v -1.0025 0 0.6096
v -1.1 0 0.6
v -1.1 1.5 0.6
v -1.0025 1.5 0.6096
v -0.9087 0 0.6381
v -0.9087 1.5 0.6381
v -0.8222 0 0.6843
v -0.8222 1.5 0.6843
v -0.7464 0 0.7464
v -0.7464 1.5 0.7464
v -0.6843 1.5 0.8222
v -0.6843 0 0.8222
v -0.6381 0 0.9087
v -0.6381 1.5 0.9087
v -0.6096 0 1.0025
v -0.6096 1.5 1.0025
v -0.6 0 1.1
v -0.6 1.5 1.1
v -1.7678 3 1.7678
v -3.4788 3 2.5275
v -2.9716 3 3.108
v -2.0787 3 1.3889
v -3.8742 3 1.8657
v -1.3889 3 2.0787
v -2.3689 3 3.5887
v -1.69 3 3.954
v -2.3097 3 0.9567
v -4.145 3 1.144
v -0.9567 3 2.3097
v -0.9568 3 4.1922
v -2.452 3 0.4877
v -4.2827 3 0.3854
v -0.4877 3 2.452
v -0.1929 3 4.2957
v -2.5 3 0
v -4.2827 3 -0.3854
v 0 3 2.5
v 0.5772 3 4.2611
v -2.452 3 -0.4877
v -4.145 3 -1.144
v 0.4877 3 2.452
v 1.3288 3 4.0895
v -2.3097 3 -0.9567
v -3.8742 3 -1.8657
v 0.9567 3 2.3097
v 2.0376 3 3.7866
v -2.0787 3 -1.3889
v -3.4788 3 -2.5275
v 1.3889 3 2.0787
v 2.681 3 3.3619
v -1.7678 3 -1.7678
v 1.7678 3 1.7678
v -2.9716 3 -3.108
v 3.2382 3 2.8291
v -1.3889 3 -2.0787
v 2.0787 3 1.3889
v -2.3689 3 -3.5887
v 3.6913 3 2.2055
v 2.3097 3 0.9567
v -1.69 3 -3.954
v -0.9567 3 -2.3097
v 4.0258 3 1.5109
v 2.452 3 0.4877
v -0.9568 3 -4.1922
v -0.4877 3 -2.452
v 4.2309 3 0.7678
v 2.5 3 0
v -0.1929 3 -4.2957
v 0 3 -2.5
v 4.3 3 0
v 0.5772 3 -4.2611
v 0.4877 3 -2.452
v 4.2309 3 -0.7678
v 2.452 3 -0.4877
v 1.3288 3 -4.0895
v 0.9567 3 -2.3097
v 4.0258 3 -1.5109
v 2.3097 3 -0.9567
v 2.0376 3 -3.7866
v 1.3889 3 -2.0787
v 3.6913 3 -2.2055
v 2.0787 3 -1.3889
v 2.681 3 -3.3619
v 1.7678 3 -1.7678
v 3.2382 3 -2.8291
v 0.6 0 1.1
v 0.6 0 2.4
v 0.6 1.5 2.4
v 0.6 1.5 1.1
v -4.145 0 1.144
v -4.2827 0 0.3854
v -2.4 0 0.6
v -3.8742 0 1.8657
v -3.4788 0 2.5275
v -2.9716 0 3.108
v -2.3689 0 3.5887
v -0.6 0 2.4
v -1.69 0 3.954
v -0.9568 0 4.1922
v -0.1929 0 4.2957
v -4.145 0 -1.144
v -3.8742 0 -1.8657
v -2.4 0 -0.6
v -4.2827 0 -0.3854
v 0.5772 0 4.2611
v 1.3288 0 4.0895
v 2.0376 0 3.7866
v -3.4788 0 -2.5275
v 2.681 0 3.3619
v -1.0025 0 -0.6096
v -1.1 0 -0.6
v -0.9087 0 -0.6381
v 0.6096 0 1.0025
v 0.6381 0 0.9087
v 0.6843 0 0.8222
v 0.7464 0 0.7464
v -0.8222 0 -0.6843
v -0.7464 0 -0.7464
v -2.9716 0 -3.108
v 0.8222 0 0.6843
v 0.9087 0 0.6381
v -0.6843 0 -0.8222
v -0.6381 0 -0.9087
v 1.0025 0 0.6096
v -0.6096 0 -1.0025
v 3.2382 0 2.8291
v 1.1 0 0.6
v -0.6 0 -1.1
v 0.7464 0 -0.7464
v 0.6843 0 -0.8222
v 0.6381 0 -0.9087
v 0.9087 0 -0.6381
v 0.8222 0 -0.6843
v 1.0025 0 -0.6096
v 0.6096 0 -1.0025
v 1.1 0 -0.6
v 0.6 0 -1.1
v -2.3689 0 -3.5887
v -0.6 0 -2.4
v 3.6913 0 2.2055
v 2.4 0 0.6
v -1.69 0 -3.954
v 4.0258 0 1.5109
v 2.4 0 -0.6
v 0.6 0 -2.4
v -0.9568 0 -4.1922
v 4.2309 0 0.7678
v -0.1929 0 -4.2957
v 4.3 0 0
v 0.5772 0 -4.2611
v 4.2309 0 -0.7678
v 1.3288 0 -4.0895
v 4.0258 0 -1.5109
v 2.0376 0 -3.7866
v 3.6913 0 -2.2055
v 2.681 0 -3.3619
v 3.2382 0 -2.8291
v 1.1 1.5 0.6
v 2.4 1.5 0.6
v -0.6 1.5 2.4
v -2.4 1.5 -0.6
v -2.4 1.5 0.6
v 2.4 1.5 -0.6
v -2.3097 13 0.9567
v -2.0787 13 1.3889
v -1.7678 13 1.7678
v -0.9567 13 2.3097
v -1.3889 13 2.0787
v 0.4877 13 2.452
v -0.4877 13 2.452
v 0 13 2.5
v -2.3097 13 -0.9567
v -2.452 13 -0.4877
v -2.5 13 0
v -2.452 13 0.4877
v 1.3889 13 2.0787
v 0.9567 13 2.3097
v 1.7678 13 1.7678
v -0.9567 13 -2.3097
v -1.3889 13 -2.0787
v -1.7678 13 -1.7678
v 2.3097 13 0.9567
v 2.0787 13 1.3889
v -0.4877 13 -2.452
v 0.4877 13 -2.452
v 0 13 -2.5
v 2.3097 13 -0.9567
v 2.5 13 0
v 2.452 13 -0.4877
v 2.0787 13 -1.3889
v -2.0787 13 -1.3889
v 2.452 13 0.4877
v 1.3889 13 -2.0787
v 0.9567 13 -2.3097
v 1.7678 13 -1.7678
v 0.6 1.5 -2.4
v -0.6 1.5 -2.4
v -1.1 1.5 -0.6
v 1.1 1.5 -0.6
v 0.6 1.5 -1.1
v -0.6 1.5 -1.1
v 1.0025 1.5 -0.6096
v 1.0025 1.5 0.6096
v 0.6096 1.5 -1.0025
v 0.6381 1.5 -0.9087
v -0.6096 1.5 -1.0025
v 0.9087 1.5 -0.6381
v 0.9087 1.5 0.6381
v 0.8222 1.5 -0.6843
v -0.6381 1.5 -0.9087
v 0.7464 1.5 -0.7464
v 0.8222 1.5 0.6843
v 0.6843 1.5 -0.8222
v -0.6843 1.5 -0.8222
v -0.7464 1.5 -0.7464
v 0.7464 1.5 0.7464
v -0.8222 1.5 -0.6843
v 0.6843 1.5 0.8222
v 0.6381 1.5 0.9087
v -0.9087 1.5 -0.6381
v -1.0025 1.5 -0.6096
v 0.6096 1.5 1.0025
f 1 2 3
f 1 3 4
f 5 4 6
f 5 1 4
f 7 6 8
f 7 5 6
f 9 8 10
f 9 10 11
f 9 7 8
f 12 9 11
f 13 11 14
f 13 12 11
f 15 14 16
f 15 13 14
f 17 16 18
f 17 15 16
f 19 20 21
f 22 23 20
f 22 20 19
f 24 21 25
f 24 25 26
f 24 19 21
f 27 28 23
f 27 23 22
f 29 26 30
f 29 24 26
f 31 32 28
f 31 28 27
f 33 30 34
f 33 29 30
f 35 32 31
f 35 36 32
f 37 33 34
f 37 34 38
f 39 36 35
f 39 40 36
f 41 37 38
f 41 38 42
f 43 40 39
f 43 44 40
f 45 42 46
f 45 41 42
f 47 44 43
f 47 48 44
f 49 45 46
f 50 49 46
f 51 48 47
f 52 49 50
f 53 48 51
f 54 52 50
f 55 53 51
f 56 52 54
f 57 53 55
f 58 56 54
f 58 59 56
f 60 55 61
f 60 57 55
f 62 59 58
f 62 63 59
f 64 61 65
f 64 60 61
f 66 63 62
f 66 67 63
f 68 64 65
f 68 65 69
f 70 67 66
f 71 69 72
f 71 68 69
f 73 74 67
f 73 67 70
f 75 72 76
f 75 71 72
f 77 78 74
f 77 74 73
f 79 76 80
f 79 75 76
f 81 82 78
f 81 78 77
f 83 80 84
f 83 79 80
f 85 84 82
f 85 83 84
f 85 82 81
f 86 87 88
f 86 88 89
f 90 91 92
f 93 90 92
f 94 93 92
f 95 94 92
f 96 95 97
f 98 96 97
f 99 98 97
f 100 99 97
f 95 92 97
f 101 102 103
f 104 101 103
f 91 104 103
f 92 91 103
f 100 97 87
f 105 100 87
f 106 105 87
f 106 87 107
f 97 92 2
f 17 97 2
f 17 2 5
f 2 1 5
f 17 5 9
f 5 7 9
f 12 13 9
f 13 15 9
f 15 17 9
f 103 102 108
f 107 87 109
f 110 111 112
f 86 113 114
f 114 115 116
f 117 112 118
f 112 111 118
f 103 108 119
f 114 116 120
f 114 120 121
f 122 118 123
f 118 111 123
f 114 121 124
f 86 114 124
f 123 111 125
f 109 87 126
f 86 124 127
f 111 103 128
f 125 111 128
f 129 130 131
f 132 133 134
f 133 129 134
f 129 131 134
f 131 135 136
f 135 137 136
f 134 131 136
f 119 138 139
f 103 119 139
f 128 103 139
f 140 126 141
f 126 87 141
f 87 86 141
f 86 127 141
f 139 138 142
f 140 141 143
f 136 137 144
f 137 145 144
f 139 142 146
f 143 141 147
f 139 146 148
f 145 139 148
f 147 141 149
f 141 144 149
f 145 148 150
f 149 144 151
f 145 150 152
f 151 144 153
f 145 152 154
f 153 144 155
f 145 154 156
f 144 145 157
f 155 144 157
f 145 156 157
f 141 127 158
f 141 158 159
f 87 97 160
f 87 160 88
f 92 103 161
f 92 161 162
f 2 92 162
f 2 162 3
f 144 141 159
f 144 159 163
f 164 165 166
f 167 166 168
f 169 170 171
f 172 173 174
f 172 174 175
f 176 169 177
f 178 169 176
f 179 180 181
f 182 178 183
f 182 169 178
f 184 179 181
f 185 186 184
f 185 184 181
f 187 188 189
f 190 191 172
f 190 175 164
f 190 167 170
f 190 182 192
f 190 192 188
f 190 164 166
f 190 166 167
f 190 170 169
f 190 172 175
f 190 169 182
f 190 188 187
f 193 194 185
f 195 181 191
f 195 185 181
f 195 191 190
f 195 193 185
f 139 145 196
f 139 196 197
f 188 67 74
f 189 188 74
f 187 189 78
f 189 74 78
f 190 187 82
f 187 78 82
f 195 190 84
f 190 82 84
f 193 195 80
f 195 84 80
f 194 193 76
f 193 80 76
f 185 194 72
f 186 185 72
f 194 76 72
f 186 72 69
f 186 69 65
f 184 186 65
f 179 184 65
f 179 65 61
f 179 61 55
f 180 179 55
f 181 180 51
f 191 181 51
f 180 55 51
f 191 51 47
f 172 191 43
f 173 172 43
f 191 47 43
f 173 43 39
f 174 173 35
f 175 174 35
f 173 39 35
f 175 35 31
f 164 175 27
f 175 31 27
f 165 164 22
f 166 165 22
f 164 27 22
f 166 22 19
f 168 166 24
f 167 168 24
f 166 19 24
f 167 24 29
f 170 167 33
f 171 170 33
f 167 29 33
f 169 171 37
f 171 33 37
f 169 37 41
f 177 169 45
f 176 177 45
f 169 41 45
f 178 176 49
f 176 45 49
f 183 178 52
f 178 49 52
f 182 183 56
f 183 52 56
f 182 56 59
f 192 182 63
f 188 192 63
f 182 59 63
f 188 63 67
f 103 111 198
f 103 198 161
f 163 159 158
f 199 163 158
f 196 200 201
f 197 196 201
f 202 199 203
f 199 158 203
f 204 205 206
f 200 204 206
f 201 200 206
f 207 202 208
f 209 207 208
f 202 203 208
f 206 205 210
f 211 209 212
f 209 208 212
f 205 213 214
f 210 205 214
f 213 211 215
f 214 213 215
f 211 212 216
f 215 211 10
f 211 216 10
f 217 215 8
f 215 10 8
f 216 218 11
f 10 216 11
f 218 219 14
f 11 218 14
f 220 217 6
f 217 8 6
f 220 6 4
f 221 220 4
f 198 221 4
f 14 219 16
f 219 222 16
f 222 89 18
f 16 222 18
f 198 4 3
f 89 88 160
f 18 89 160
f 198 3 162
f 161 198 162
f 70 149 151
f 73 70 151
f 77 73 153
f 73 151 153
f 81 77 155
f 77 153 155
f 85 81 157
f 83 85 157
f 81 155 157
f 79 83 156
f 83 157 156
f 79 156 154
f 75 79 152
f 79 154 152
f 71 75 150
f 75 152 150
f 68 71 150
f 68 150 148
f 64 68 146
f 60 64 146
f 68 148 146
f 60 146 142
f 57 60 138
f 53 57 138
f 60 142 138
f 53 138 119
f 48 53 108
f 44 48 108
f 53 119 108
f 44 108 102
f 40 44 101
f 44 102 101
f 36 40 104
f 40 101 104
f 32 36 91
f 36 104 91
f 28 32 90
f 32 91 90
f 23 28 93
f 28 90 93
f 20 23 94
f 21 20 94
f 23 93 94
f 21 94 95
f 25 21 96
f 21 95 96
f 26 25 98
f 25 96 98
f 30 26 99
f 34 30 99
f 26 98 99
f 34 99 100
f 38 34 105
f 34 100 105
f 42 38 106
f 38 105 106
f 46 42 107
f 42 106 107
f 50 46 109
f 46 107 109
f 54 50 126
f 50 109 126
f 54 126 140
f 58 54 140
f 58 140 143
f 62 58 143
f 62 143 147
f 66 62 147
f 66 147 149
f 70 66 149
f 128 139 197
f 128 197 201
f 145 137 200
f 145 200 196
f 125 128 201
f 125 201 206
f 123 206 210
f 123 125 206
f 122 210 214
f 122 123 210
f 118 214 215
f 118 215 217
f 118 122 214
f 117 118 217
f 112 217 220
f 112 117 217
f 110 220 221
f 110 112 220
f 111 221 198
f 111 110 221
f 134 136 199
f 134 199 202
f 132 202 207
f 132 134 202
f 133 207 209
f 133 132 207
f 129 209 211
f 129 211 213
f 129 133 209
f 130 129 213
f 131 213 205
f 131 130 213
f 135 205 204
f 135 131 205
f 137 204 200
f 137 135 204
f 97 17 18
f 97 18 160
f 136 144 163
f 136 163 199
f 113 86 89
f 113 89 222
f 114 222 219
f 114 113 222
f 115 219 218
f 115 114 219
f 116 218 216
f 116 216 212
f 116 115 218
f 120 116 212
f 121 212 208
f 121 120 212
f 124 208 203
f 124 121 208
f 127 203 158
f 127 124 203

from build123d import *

# Parameters (mm, degrees)
SKETCH_1_R          = 4.3
EXTRUDE_1_DEPTH     = 3
SKETCH_2_R          = 2.5
EXTRUDE_2_DEPTH     = 10
CUT_EXTRUDE_1_DEPTH = 1.5


with BuildPart() as part:
    # 草图1 → 凸台-拉伸1 (new body)
    with BuildSketch(Plane(origin=(0, 0, 0), x_dir=(1, 0, 0), z_dir=(0, 1, 0))):
        Circle(SKETCH_1_R)
    extrude(amount=EXTRUDE_1_DEPTH)

    # 草图2 → 凸台-拉伸2 (add)
    with BuildSketch(Plane(origin=(0, 3, 0), x_dir=(1, 0, 0), z_dir=(0, 1, 0))):
        Circle(SKETCH_2_R)
    extrude(amount=EXTRUDE_2_DEPTH)

    # 草图3 → 切除-拉伸1 (cut)
    with BuildSketch(Plane.XZ):
        with BuildLine():
            Line((-0.6, 1.1), (-0.6, 2.4))
            Line((-0.6, 2.4), (0.6, 2.4))
            Line((0.6, 2.4), (0.6, 1.1))
            ThreePointArc((0.6, 1.1), (0.746446609, 0.746446609), (1.1, 0.6))
            Line((1.1, 0.6), (2.4, 0.6))
            Line((2.4, 0.6), (2.4, -0.6))
            Line((2.4, -0.6), (1.1, -0.6))
            ThreePointArc((1.1, -0.6), (0.746446609, -0.746446609), (0.6, -1.1))
            Line((0.6, -1.1), (0.6, -2.4))
            Line((0.6, -2.4), (-0.6, -2.4))
            Line((-0.6, -2.4), (-0.6, -1.1))
            ThreePointArc((-0.6, -1.1), (-0.746446609, -0.746446609), (-1.1, -0.6))
            Line((-1.1, -0.6), (-2.4, -0.6))
            Line((-2.4, -0.6), (-2.4, 0.6))
            Line((-2.4, 0.6), (-1.1, 0.6))
            ThreePointArc((-1.1, 0.6), (-0.746446609, 0.746446609), (-0.6, 1.1))
        make_face()
    extrude(amount=-CUT_EXTRUDE_1_DEPTH, mode=Mode.SUBTRACT)


solid = part.part
